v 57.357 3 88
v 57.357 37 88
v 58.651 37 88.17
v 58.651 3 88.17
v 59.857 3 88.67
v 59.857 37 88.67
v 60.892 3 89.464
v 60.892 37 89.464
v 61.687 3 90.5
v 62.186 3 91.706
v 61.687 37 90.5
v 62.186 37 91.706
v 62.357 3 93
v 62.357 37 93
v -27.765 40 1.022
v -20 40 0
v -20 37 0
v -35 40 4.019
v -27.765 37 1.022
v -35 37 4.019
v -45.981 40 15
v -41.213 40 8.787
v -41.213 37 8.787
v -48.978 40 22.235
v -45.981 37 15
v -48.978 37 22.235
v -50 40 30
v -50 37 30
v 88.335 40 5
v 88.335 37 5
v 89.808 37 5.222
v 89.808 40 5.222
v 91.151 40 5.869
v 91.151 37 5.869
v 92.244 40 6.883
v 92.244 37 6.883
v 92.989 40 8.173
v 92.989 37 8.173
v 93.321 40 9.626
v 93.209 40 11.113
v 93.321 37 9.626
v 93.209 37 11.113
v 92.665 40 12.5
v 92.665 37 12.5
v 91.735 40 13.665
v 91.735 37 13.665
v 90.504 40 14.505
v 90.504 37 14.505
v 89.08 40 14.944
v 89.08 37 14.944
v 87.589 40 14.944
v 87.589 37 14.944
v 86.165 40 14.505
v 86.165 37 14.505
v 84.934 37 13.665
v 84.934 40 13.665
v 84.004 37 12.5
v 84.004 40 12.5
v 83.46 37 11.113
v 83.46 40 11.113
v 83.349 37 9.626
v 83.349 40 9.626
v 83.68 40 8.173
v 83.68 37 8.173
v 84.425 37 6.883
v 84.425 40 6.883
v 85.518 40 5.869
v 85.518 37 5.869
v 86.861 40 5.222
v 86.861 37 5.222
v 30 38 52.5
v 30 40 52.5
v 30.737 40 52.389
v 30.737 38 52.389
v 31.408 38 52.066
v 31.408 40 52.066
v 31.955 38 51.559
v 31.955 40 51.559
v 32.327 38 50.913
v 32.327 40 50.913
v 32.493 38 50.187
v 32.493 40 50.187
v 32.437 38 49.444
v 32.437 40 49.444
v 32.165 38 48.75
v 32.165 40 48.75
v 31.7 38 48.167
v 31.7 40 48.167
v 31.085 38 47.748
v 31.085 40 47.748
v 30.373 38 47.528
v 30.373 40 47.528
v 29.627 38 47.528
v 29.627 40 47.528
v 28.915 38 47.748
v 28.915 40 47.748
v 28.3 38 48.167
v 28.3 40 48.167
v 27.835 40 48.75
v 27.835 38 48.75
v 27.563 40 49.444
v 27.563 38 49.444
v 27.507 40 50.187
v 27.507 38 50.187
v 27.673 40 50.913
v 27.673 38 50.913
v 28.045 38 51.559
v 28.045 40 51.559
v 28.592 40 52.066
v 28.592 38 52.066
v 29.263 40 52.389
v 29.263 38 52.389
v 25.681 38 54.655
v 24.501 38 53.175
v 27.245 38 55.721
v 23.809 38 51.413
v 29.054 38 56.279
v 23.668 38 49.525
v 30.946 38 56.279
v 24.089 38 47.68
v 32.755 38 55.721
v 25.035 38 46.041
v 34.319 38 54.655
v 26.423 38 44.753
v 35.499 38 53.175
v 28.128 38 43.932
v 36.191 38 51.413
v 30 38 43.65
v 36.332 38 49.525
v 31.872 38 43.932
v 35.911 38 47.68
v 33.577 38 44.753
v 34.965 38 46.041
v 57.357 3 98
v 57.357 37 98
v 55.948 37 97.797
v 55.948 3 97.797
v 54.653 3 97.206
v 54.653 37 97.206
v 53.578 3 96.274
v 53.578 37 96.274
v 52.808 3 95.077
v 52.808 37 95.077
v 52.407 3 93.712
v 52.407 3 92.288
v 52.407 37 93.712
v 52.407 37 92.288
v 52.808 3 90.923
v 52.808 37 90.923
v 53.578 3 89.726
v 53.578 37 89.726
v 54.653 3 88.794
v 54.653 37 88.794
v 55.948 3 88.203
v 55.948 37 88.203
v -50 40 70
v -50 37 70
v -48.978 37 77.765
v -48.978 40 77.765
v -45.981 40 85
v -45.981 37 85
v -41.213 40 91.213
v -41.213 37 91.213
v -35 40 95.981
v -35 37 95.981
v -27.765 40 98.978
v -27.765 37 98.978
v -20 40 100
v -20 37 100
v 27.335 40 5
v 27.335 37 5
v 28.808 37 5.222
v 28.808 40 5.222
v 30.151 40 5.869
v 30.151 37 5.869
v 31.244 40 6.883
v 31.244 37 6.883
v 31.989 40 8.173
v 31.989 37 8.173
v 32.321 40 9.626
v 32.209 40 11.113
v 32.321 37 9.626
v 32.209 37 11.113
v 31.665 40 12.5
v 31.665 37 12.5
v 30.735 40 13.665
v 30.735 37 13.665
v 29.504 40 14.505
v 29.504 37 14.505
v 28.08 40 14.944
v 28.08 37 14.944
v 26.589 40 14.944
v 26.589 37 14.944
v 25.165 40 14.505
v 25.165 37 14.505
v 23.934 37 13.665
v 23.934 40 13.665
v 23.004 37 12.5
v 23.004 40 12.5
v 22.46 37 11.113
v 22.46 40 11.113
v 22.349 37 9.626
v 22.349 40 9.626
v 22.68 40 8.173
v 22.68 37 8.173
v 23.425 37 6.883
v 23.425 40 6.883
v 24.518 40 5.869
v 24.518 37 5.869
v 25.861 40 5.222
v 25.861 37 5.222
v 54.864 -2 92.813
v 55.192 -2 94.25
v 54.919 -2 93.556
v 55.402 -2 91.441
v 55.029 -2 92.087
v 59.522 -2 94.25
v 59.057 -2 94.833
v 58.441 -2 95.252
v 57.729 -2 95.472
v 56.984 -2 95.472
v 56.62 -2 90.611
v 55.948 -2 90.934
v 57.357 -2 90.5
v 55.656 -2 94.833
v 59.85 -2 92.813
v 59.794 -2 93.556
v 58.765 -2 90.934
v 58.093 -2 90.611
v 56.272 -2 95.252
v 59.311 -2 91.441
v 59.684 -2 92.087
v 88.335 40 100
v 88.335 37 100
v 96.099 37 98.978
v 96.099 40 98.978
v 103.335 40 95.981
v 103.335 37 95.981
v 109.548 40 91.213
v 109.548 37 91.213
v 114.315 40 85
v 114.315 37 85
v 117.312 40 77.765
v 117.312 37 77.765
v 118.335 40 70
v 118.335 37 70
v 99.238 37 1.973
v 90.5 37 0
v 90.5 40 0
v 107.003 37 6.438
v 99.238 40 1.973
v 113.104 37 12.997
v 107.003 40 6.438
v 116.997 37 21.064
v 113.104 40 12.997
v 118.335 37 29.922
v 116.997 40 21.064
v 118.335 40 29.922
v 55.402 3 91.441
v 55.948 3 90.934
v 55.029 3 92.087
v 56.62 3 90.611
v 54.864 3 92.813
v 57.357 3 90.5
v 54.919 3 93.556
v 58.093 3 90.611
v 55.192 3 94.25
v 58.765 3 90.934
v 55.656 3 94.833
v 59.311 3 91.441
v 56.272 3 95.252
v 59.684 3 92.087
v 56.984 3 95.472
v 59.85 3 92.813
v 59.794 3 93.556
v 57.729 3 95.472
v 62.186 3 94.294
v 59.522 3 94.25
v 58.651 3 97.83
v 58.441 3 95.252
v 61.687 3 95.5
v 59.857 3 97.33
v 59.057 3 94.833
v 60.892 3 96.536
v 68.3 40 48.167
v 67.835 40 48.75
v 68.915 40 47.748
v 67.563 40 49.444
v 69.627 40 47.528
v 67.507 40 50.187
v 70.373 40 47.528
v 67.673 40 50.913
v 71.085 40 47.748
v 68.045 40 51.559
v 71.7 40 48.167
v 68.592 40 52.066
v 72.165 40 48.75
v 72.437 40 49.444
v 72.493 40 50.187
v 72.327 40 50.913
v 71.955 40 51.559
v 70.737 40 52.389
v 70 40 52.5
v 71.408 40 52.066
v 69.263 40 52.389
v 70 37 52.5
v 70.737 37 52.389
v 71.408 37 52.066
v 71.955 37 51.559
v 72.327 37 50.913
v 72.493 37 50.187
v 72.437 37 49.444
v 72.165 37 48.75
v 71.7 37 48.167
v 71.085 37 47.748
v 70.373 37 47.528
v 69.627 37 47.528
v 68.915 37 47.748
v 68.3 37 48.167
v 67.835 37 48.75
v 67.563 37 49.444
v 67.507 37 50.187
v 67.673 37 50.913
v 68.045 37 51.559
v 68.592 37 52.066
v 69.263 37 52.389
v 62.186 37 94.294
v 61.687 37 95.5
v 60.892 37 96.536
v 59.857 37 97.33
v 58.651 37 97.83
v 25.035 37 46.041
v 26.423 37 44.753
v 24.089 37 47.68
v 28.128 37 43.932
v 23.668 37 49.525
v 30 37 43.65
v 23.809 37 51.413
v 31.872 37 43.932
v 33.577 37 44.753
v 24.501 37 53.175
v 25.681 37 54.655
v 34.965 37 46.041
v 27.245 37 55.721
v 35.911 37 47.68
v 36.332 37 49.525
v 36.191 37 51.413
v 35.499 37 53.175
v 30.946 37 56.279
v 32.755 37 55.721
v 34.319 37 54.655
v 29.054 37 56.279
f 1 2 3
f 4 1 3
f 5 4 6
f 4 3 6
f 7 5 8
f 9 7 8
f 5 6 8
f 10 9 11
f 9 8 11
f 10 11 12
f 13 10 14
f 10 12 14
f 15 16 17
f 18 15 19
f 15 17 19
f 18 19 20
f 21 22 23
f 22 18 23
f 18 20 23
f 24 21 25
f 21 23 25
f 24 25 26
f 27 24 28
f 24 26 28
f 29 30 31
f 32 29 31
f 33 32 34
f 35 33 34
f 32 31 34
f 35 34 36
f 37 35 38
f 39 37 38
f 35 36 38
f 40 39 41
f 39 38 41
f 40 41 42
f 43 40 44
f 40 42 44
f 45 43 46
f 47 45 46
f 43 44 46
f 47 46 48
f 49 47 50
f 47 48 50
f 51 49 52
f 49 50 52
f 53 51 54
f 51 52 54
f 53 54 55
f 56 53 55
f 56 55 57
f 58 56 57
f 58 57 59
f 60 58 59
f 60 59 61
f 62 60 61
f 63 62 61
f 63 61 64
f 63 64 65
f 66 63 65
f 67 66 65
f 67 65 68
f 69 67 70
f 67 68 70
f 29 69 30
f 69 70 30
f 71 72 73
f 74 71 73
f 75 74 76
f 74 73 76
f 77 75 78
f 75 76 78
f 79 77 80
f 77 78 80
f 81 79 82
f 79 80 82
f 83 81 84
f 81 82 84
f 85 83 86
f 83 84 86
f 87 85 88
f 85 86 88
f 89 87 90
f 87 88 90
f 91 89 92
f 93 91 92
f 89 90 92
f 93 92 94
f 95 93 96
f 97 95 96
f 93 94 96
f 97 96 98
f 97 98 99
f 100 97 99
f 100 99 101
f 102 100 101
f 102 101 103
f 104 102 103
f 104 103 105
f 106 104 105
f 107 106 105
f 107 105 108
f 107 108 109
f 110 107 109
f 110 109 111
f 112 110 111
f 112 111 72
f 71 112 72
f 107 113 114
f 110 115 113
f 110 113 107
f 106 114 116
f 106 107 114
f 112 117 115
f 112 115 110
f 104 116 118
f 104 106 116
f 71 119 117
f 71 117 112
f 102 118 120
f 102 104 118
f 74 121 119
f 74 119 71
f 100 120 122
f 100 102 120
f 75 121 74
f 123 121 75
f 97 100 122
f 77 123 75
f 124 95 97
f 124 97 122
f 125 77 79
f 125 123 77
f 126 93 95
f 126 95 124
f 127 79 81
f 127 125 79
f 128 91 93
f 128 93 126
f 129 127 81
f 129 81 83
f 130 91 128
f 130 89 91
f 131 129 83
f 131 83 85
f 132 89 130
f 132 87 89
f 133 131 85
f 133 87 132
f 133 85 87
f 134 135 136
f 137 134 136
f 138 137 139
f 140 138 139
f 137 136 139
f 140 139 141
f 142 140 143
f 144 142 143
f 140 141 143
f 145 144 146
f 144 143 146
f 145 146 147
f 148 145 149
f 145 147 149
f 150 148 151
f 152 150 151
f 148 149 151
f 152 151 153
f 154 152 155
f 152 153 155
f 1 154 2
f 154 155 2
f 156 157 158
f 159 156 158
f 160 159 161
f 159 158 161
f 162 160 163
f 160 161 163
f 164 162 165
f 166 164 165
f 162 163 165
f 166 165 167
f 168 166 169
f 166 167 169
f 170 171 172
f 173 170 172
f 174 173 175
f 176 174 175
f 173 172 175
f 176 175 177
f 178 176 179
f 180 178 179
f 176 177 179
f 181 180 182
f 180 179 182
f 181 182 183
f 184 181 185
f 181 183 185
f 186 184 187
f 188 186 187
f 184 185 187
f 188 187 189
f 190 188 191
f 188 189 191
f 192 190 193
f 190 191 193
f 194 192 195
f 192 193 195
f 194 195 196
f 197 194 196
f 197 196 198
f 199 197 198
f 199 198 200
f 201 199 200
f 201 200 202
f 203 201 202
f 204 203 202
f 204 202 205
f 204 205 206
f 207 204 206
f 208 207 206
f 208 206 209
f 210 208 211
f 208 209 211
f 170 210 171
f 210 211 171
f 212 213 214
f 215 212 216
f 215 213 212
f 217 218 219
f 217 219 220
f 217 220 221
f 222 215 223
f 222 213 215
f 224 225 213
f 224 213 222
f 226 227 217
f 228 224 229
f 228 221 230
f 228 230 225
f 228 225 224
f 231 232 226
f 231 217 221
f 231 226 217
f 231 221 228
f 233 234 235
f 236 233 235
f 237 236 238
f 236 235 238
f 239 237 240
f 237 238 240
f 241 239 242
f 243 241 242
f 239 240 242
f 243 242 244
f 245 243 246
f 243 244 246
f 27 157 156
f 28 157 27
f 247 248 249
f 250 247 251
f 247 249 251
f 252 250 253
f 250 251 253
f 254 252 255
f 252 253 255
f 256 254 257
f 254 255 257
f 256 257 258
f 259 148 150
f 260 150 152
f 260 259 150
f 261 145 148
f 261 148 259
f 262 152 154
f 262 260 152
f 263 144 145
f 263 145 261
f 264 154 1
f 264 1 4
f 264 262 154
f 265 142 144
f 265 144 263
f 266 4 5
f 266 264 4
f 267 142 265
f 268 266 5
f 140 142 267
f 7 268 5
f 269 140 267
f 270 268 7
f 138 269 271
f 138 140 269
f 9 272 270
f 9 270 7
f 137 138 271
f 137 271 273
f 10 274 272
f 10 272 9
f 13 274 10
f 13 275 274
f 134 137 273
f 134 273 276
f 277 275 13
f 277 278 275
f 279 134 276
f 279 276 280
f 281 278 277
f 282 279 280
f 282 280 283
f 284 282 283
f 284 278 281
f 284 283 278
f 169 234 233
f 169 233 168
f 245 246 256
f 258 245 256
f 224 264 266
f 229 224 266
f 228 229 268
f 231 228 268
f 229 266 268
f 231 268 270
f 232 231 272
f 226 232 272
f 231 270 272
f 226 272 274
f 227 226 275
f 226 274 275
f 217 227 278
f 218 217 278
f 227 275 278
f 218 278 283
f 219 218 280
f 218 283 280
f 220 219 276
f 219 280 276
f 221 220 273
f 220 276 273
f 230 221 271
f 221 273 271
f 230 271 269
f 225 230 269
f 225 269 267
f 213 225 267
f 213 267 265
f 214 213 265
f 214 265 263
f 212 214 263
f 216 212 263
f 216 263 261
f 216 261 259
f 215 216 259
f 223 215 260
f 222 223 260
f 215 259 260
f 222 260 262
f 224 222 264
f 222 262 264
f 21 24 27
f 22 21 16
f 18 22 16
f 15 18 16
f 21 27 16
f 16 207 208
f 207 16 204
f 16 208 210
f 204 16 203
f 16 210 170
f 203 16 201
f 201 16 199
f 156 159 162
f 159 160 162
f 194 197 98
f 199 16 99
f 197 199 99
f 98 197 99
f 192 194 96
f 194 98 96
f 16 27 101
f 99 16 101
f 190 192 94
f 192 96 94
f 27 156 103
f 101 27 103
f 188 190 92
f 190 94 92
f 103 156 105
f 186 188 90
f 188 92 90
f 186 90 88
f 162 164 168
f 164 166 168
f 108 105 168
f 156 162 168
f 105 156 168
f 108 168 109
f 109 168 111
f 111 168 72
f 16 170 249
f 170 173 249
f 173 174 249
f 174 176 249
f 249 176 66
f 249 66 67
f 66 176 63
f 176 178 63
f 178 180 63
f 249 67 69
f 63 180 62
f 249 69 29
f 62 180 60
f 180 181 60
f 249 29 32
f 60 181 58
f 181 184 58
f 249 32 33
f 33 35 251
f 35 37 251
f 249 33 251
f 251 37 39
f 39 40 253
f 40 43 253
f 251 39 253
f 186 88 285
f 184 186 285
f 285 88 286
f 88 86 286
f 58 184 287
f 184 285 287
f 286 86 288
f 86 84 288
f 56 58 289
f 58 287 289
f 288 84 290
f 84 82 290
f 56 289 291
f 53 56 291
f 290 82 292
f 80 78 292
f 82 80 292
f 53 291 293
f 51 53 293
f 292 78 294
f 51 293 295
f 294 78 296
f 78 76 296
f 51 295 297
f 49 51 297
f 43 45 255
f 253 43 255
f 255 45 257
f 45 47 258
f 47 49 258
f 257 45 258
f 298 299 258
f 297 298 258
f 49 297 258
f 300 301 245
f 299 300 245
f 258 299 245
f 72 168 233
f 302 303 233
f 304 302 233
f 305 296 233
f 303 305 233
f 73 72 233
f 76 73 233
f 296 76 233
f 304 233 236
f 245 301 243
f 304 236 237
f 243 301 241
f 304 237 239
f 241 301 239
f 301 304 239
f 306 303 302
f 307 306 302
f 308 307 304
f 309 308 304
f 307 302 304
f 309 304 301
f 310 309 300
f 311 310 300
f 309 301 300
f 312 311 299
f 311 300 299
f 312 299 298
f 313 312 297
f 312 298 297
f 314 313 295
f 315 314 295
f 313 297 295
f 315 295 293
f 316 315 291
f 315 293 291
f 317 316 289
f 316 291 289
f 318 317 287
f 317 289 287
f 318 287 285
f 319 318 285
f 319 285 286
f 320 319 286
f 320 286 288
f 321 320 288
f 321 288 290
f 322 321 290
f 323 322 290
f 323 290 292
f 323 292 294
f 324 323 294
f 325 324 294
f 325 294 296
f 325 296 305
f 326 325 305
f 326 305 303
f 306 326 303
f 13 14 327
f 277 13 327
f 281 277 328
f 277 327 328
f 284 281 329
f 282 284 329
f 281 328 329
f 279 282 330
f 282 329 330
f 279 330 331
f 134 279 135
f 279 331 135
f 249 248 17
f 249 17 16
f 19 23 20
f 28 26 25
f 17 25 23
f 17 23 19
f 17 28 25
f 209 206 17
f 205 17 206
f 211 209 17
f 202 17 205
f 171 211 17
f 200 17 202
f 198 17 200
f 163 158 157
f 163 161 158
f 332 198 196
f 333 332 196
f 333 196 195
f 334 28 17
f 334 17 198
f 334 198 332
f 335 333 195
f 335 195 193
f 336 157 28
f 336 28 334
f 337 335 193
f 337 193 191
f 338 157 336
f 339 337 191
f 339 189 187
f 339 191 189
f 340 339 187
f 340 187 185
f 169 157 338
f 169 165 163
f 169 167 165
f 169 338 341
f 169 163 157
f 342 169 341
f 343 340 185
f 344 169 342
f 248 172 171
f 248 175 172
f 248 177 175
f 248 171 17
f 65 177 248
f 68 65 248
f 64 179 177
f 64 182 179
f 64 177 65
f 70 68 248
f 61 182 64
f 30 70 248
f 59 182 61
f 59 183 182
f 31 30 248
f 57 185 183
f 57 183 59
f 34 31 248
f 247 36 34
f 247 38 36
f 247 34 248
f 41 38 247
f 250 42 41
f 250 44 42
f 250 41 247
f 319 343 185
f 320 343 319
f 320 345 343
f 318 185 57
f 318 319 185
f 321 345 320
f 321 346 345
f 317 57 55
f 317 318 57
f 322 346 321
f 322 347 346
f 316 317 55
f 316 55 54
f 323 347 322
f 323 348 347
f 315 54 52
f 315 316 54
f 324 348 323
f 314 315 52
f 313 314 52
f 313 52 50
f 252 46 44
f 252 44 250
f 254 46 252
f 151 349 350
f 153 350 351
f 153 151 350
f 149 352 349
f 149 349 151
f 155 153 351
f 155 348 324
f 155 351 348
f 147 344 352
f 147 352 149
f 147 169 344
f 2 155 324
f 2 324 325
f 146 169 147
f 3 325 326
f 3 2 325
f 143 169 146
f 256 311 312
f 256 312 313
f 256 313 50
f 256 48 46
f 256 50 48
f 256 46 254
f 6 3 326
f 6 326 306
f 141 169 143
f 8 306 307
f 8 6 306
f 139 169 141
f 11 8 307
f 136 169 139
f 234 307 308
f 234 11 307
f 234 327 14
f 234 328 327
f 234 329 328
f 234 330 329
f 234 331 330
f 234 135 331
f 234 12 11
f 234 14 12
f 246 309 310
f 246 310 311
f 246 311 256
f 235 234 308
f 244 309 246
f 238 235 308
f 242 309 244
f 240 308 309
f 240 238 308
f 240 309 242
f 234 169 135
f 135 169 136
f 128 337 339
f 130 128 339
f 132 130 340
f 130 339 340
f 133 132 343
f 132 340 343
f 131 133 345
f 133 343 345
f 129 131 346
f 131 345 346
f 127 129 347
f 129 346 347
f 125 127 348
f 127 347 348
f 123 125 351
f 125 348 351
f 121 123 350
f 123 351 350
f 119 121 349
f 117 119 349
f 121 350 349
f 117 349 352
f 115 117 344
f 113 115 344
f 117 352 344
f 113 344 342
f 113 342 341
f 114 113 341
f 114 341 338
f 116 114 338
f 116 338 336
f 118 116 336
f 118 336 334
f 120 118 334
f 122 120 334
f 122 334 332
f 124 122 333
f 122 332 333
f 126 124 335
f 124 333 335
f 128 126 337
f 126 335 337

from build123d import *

# Parameters (mm, degrees)
EXTRUDE_1_DEPTH           = 50
EXTRUDE_1_DEPTH_BACK      = 50
SKETCH_2_W                = 200
SKETCH_2_H                = 100
EXTRUDE_2_DEPTH           = 40
SKETCH_3_W                = 200
SKETCH_3_H                = 34
CUT_EXTRUDE_1_DEPTH       = 100
CUT_EXTRUDE_2_DEPTH       = 279.66871012
SKETCH_8_R                = 2.5
CUT_EXTRUDE_4_DEPTH       = 276.238532913
SKETCH_10_R               = 5
CUT_EXTRUDE_5_DEPTH       = 260.608358879
EXTRUDE_5_DEPTH           = 10
SKETCH_13_W               = 74.115787845
SKETCH_13_H               = 3
EXTRUDE_7_DEPTH           = 81
SKETCH_14_W               = 207.5
SKETCH_14_H               = 100
EXTRUDE_8_DEPTH           = 7
EXTRUDE_9_DEPTH           = 10
SKETCH_17_R               = 6.35
CUT_EXTRUDE_6_DEPTH       = 1
CUT_EXTRUDE_START         = -1
SKETCH_18_R               = 6.35
CUT_EXTRUDE_7_DEPTH       = 1
SKETCH_20_R               = 5
CUT_EXTRUDE_8_DEPTH       = 3
CUT_EXTRUDE_9_DEPTH       = 273.255129638
CUT_EXTRUDE_9_DEPTH_BACK  = 273.255129638
SKETCH_21_W               = 31.665374736
SKETCH_21_H               = 100
SKETCH_22_R               = 5
EXTRUDE_10_DEPTH          = 37
FILLET_1_R                = 30
FILLET_2_R                = 30
CUT_EXTRUDE_10_DEPTH      = 248.444254611
CUT_EXTRUDE_10_DEPTH_BACK = 248.444254611
CUT_EXTRUDE_11_DEPTH      = 211.689689342
CUT_EXTRUDE_11_DEPTH_BACK = 211.689689342
CUT_EXTRUDE_12_DEPTH      = 174.368632309
CUT_EXTRUDE_12_DEPTH_BACK = 174.368632309
SKETCH_26_R               = 5
CUT_EXTRUDE_13_DEPTH      = 153.295269567
CUT_EXTRUDE_13_DEPTH_BACK = 153.295269567
CUT_EXTRUDE_14_DEPTH      = 160.286168691
CUT_EXTRUDE_14_DEPTH_BACK = 160.286168691
SKETCH_30_R               = 7.5
CUT_EXTRUDE_15_DEPTH      = 160.286168691
CUT_EXTRUDE_15_DEPTH_BACK = 160.286168691
SKETCH_31_R               = 7.5
SKETCH_31_R_2             = 5
SKETCH_32_R               = 7.5
SKETCH_32_R_2             = 5
EXTRUDE_12_DEPTH          = 3
SKETCH_33_R               = 7.5
SKETCH_33_R_2             = 5
EXTRUDE_13_DEPTH          = 3
SKETCH_34_R               = 5
EXTRUDE_14_DEPTH          = 45
CUT_EXTRUDE_17_DEPTH      = 178.031776809
CUT_EXTRUDE_17_DEPTH_BACK = 178.031776809
SKETCH_37_W               = 132.207085757
SKETCH_37_H               = 67.753693261
EXTRUDE_19_DEPTH          = 34
SKETCH_44_R               = 2.5
EXTRUDE_20_DEPTH          = 5
SKETCH_41_R               = 7.5
SKETCH_41_R_2             = 5
EXTRUDE_17_DEPTH          = 3
SKETCH_42_R               = 7.5
SKETCH_42_R_2             = 5
EXTRUDE_18_DEPTH          = 3


with BuildPart() as part:
    # 草图1 → 凸台-拉伸1 (new, two sides: drawn at the far end of the back side and taken through both)
    with BuildSketch(Plane(origin=(0, 0, 0), x_dir=(1, 0, 0), z_dir=(0, 1, 0)).offset(-EXTRUDE_1_DEPTH_BACK)):
        Polygon((9.5, 12.5), (9.5, 0), (90.5, 0), (90.5, 12.5), (90.5, 212.5), (9.5, 212.5), align=None)
    extrude(amount=EXTRUDE_1_DEPTH + EXTRUDE_1_DEPTH_BACK)

    # 草图2 → 凸台-拉伸2 (add)
    with BuildSketch(Plane(origin=(0, 0, 0), x_dir=(-1, 0, 0), z_dir=(0, -1, 0))):
        with Locations((-50, -50)):
            Rectangle(SKETCH_2_W, SKETCH_2_H)
    extrude(amount=-EXTRUDE_2_DEPTH)

    # 草图3 → 切除-拉伸1 (cut)
    with BuildSketch(Plane.XY.offset(100)):
        with Locations((50, 20)):
            Rectangle(SKETCH_3_W, SKETCH_3_H)
    extrude(amount=-CUT_EXTRUDE_1_DEPTH, mode=Mode.SUBTRACT)

    # 草图6 → 切除-拉伸2 (cut, through all)
    with BuildSketch(Plane(origin=(0, 50, 0), x_dir=(1, 0, 0), z_dir=(0, 1, 0))):
        Polygon((12.5, 905.325014188), (12.5, 212.5), (12.5, 5), (87.5, 5), (87.5, 212.5), (87.5, 905.325014188), (87.5, 2290.975042562), (12.5, 2290.975042562), align=None)
    extrude(amount=-CUT_EXTRUDE_2_DEPTH, mode=Mode.SUBTRACT)

    # 草图8 → 切除-拉伸4 (cut, through all)
    with BuildSketch(Plane(origin=(0, 40, 0), x_dir=(1, 0, 0), z_dir=(0, 1, 0))):
        with Locations(Location((70, -50, 0), (0, 0, 270))):
            Circle(SKETCH_8_R)
        with Locations(Location((30, -50, 0), (0, 0, 270))):
            Circle(SKETCH_8_R)
    extrude(amount=-CUT_EXTRUDE_4_DEPTH, mode=Mode.SUBTRACT)

    # 草图10 → 切除-拉伸5 (cut, through all)
    with BuildSketch(Plane(origin=(90.5, 0, 0), x_dir=(0, 0, -1), z_dir=(1, 0, 0))):
        with Locations((80, 0)):
            Circle(SKETCH_10_R)
        with Locations((180, 0)):
            Circle(SKETCH_10_R)
    extrude(amount=-CUT_EXTRUDE_5_DEPTH, mode=Mode.SUBTRACT)

    # 草图11 → 凸台-拉伸5 (add)
    with BuildSketch(Plane.ZY.offset(-9.5)):
        Polygon((-30.905613639, 83.415207604), (-74.094429483, 50), (0, 50), (0, 40), (83.32101017, 40), align=None)
    extrude(amount=-EXTRUDE_5_DEPTH)

    # 草图13 → 凸台-拉伸7 (add)
    with BuildSketch(Plane(origin=(90.5, 0, 0), x_dir=(0, 0, -1), z_dir=(1, 0, 0))):
        with Locations((37.057893922, 51.5)):
            Rectangle(SKETCH_13_W, SKETCH_13_H)
    extrude(amount=-EXTRUDE_7_DEPTH)

    # 草图14 → 凸台-拉伸8 (add)
    with BuildSketch(Plane(origin=(12.5, 0, 0), x_dir=(0, 0, -1), z_dir=(1, 0, 0))):
        with Locations((108.75, 0)):
            Rectangle(SKETCH_14_W, SKETCH_14_H)
    extrude(amount=EXTRUDE_8_DEPTH)

    # 草图15 → 凸台-拉伸9 (add)
    with BuildSketch(Plane(origin=(90.5, 0, 0), x_dir=(0, 0, -1), z_dir=(1, 0, 0))):
        Polygon((30.905613639, 83.415207604), (-82.902171575, 40), (0, 40), (0, 53), (70.216960007, 53), align=None)
    extrude(amount=-EXTRUDE_9_DEPTH)

    # 草图17 → 切除-拉伸6 (cut)
    with BuildSketch(Plane(origin=(0, 37, 0), x_dir=(-1, 0, 0), z_dir=(0, -1, 0))):
        with Locations(Location((-30, -50, 0), (0, 0, 90))):
            Circle(SKETCH_17_R)
    extrude(amount=-CUT_EXTRUDE_6_DEPTH, mode=Mode.SUBTRACT)

    # 草图18 → 切除-拉伸7 (cut)
    with BuildSketch(Plane(origin=(0, 3, 0), x_dir=(1, 0, 0), z_dir=(0, 1, 0)).offset(CUT_EXTRUDE_START)):
        with Locations(Location((30, -50, 0), (0, 0, 90))):
            Circle(SKETCH_18_R)
    extrude(amount=CUT_EXTRUDE_7_DEPTH, mode=Mode.SUBTRACT)

    # 草图20 → 切除-拉伸8 (cut)
    with BuildSketch(Plane.XZ):
        with Locations(Location((-31.25, 50, 0), (0, 0, 270))):
            Circle(SKETCH_20_R)
        with Locations(Location((91.25, 50, 0), (0, 0, 270))):
            Circle(SKETCH_20_R)
    extrude(amount=-CUT_EXTRUDE_8_DEPTH, mode=Mode.SUBTRACT)

    # 草图21 → 切除-拉伸9 (cut, two sides: drawn at the far end of the back side and taken through both)
    with BuildSketch(Plane(origin=(0, 3, 0), x_dir=(1, 0, 0), z_dir=(0, 1, 0)).offset(-CUT_EXTRUDE_9_DEPTH_BACK)):
        with Locations((134.167312632, -50)):
            Rectangle(SKETCH_21_W, SKETCH_21_H)
    extrude(amount=CUT_EXTRUDE_9_DEPTH + CUT_EXTRUDE_9_DEPTH_BACK, mode=Mode.SUBTRACT)

    # 草图22 → 凸台-拉伸10 (add)
    with BuildSketch(Plane.XZ):
        with Locations((-28.834995313, 14.93844285)):
            Circle(SKETCH_22_R)
        with Locations((99.943738589, 14.93844285)):
            Circle(SKETCH_22_R)
        with Locations((47.358621855, 88.902784002)):
            Circle(SKETCH_22_R)
    extrude(amount=-EXTRUDE_10_DEPTH)

    # 圆角1
    # the kernel refuses this fillet: 30 mm, written as the material it takes off along each edge
    with BuildSketch(Plane(origin=(-32.536340759, 83.415207604, -30.905613639), x_dir=(0, -0.6119293356637439, -0.7909124402575352), z_dir=(1, 0, 0))) as fillet_1_piece_1:
        with BuildLine():
            CenterArc((FILLET_1_R * 0.560484543454, -FILLET_1_R), FILLET_1_R, 90, 58.539912966)
            Line((-FILLET_1_R * 0.292519393108, -FILLET_1_R * 0.478095521948), (-FILLET_1_R * 0.309579471839, -FILLET_1_R * 0.467657432387))
            Line((-FILLET_1_R * 0.309579471839, -FILLET_1_R * 0.467657432387), (-FILLET_1_R * 0.0112096908691, FILLET_1_R * 0.02))
            Line((-FILLET_1_R * 0.0112096908691, FILLET_1_R * 0.02), (FILLET_1_R * 0.560484543454, FILLET_1_R * 0.02))
            Line((FILLET_1_R * 0.560484543454, FILLET_1_R * 0.02), (FILLET_1_R * 0.560484543454, 0))
        make_face()
    extrude(amount=94.072681518, mode=Mode.SUBTRACT)
    with BuildSketch(Plane(origin=(132.596564701, 83.415207604, -30.905613639), x_dir=(0, -0.6119293356637436, -0.7909124402575354), z_dir=(-1, 0, 0))) as fillet_1_piece_2:
        with BuildLine():
            CenterArc((FILLET_1_R * 0.561287529341, FILLET_1_R), FILLET_1_R, 211.390091687, 58.609908313)
            Line((-FILLET_1_R * 0.292353354769, FILLET_1_R * 0.479137982787), (-FILLET_1_R * 0.309426172451, FILLET_1_R * 0.468720742443))
            Line((-FILLET_1_R * 0.309426172451, FILLET_1_R * 0.468720742443), (-FILLET_1_R * 0.0112257505868, -FILLET_1_R * 0.02))
            Line((-FILLET_1_R * 0.0112257505868, -FILLET_1_R * 0.02), (FILLET_1_R * 0.561287529341, -FILLET_1_R * 0.02))
            Line((FILLET_1_R * 0.561287529341, -FILLET_1_R * 0.02), (FILLET_1_R * 0.561287529341, 0))
        make_face()
    extrude(amount=94.193129401, mode=Mode.SUBTRACT)
    with BuildSketch(Plane(origin=(118.334625264, -38, 100), x_dir=(-1, 0, 0), z_dir=(0, 1, 0)), Plane(origin=(118.334625264, -75, 100), x_dir=(-1, 0, 0), z_dir=(0, 1, 0)), Plane(origin=(-50, -38, 0), x_dir=(1, 0, 0), z_dir=(0, 1, 0)), Plane(origin=(-50, -38, 100), x_dir=(0, 0, -1), z_dir=(0, 1, 0)), Plane(origin=(-50, -75, 100), x_dir=(0, 0, -1), z_dir=(0, 1, 0)), Plane(origin=(-50, -75, 0), x_dir=(1, 0, 0), z_dir=(0, 1, 0))) as fillet_1_piece_3:
        with BuildLine():
            CenterArc((FILLET_1_R, -FILLET_1_R), FILLET_1_R, 90, 90)
            Line((0, -FILLET_1_R), (-FILLET_1_R * 0.02, -FILLET_1_R))
            Line((-FILLET_1_R * 0.02, -FILLET_1_R), (-FILLET_1_R * 0.02, FILLET_1_R * 0.02))
            Line((-FILLET_1_R * 0.02, FILLET_1_R * 0.02), (FILLET_1_R, FILLET_1_R * 0.02))
            Line((FILLET_1_R, FILLET_1_R * 0.02), (FILLET_1_R, 0))
        make_face()
    extrude(amount=153, mode=Mode.SUBTRACT)
    with BuildSketch(Plane(origin=(118.334625264, 114.804376219, 0), x_dir=(0, 0, 1), z_dir=(0, -1, 0))) as fillet_1_piece_4:
        with BuildLine():
            CenterArc((29.921750488, 30), FILLET_1_R, 184.139160489, 85.860839511)
            Line((0, 27.834625264), (-0.59843501, 27.791317769))
            ThreePointArc((-0.59843501, 27.791317769), (-0.6, 13.917312632), (-0.6, 0))
            Line((-0.6, 0), (0, -0.6))
            Line((0, -0.6), (29.921750488, -0.6))
            Line((29.921750488, -0.6), (29.921750488, 0))
        make_face()
    extrude(amount=152.608752439, mode=Mode.SUBTRACT)
    with BuildSketch(Plane(origin=(118.334625264, 77.804376219, 0), x_dir=(-1, 0, 0), z_dir=(0, -1, 0))) as fillet_1_piece_5:
        with BuildLine():
            CenterArc((30, -29.921750488), FILLET_1_R, 94.139160489, 85.860839511)
            Line((0, -29.921750488), (-0.6, -29.921750488))
            Line((-0.6, -29.921750488), (-0.6, 0))
            Line((-0.6, 0), (0, 0.6))
            ThreePointArc((0, 0.6), (13.917312632, 0.6), (27.791317769, 0.59843501))
            Line((27.791317769, 0.59843501), (27.834625264, 0))
        make_face()
    extrude(amount=152.608752439, mode=Mode.SUBTRACT)

    # 圆角2
    fillet_2_edges = [part.edges().sort_by_distance(p)[0] for p in [
        (89, 50, -212.5),
        (89, -50, -212.5),
        (14.5, 50, -212.5),
        (14.5, -50, -212.5),
    ]]
    fillet(fillet_2_edges, radius=FILLET_2_R)

    # 草图23 → 切除-拉伸10 (cut, two sides: drawn at the far end of the back side and taken through both)
    with BuildSketch(Plane(origin=(19.5, 0, 0), x_dir=(0, 0, -1), z_dir=(1, 0, 0)).offset(-CUT_EXTRUDE_10_DEPTH_BACK)):
        Polygon((-82.902171575, 40), (15.172878857, 77.413509693), (30.26062931, 83.169160038), (82.911746167, 53.484816406), (216.982404769, 51.400816531), (216.982404769, -53.030732743), (0, -55.346288159), (0, 40), align=None)
    extrude(amount=CUT_EXTRUDE_10_DEPTH + CUT_EXTRUDE_10_DEPTH_BACK, mode=Mode.SUBTRACT)

    # 草图25 → 切除-拉伸11 (cut, two sides: drawn at the far end of the back side and taken through both)
    with BuildSketch(Plane(origin=(118.334625264, 0, 0), x_dir=(0, 0, -1), z_dir=(1, 0, 0)).offset(-CUT_EXTRUDE_11_DEPTH_BACK)):
        Polygon((-96.999238457, 37), (-5.714105567, 37), (-5.714105567, 3), (-98.622428797, 3), align=None)
    extrude(amount=CUT_EXTRUDE_11_DEPTH + CUT_EXTRUDE_11_DEPTH_BACK, mode=Mode.SUBTRACT)


with BuildPart() as cut_extrude_11_piece_1:
    # of the separate pieces the step leaves, piece 1, a body of its own (cut_extrude_11_pieces)
    add(part.part.solids().sort_by_distance((118.334625264, 37, 70))[0])


with BuildPart() as cut_extrude_11_piece_2:
    # of the separate pieces the step leaves, piece 2, a body of its own (cut_extrude_11_pieces)
    add(part.part.solids().sort_by_distance((-20, 0, 0))[0])


with BuildPart() as cut_extrude_12_tool:
    # 草图26 → 切除-拉伸12 (new, two sides: drawn at the far end of the back side and taken through both)
    with BuildSketch(Plane.XZ.offset(-CUT_EXTRUDE_12_DEPTH_BACK)):
        with Locations(Location((88.334625264, 10, 0), (0, 0, 270))):
            Circle(SKETCH_26_R)
        with Locations(Location((27.334625264, 10, 0), (0, 0, 270))):
            Circle(SKETCH_26_R)
    extrude(amount=CUT_EXTRUDE_12_DEPTH + CUT_EXTRUDE_12_DEPTH_BACK)


with BuildPart() as cut_extrude_11_piece_1_1:
    add(cut_extrude_11_piece_1.part)

    # 切除-拉伸12: cut by cut_extrude_12_tool
    add(cut_extrude_12_tool.part, mode=Mode.SUBTRACT)

    # 草图27 → 切除-拉伸13 (cut, two sides: drawn at the far end of the back side and taken through both)
    with BuildSketch(Plane.ZY.offset(-34.5).offset(-CUT_EXTRUDE_13_DEPTH_BACK)):
        Polygon((-18.94184398, 81.696068066), (-17.663883038, 66.307288383), (80.739109538, 40), (87.341907742, 40), align=None)
    extrude(amount=CUT_EXTRUDE_13_DEPTH + CUT_EXTRUDE_13_DEPTH_BACK, mode=Mode.SUBTRACT)


with BuildPart() as cut_extrude_11_piece_2_1:
    add(cut_extrude_11_piece_2.part)

    # 切除-拉伸12: cut by cut_extrude_12_tool
    add(cut_extrude_12_tool.part, mode=Mode.SUBTRACT)


with BuildPart() as cut_extrude_14_tool:
    # 草图30 → 切除-拉伸14 (new, two sides: drawn at the far end of the back side and taken through both)
    with BuildSketch(Plane.XZ.offset(-37).offset(-CUT_EXTRUDE_14_DEPTH_BACK)):
        with Locations(Location((88.334625264, 10, 0), (0, 0, 270))):
            Circle(SKETCH_30_R)
    extrude(amount=CUT_EXTRUDE_14_DEPTH + CUT_EXTRUDE_14_DEPTH_BACK)


with BuildPart() as cut_extrude_11_piece_1_2:
    add(cut_extrude_11_piece_1_1.part)

    # 切除-拉伸14: cut by cut_extrude_14_tool
    add(cut_extrude_14_tool.part, mode=Mode.SUBTRACT)


with BuildPart() as cut_extrude_11_piece_2_2:
    add(cut_extrude_11_piece_2_1.part)

    # 切除-拉伸14: cut by cut_extrude_14_tool
    add(cut_extrude_14_tool.part, mode=Mode.SUBTRACT)


with BuildPart() as cut_extrude_15_tool:
    # 草图31 → 切除-拉伸15 (new, two sides: drawn at the far end of the back side and taken through both)
    with BuildSketch(Plane.XZ.offset(-37).offset(-CUT_EXTRUDE_15_DEPTH_BACK)):
        with Locations(Location((27.334625264, 10, 0), (0, 0, 270))):
            Circle(SKETCH_31_R)
        with Locations((27.334625264, 10)):
            Circle(SKETCH_31_R_2, mode=Mode.SUBTRACT)
    extrude(amount=CUT_EXTRUDE_15_DEPTH + CUT_EXTRUDE_15_DEPTH_BACK)


with BuildPart() as cut_extrude_11_piece_1_3:
    add(cut_extrude_11_piece_1_2.part)

    # 切除-拉伸15: cut by cut_extrude_15_tool
    add(cut_extrude_15_tool.part, mode=Mode.SUBTRACT)



with BuildPart() as cut_extrude_11_piece_2_3:
    add(cut_extrude_11_piece_2_2.part)

    # 切除-拉伸15: cut by cut_extrude_15_tool
    add(cut_extrude_15_tool.part, mode=Mode.SUBTRACT)

    # 草图32 → 凸台-拉伸12 (add)
    with BuildSketch(Plane.XZ):
        with Locations(Location((27.334625264, 10, 0), (0, 0, 270))):
            Circle(SKETCH_32_R)
        with Locations(Location((27.334625264, 10, 0), (0, 0, 270))):
            Circle(SKETCH_32_R_2, mode=Mode.SUBTRACT)
    extrude(amount=-EXTRUDE_12_DEPTH)

    # 草图33 → 凸台-拉伸13 (add)
    with BuildSketch(Plane.XZ):
        with Locations(Location((88.334625264, 10, 0), (0, 0, 270))):
            Circle(SKETCH_33_R)
        with Locations(Location((88.334625264, 10, 0), (0, 0, 270))):
            Circle(SKETCH_33_R_2, mode=Mode.SUBTRACT)
    extrude(amount=-EXTRUDE_13_DEPTH)


with BuildPart() as cut_extrude_11_piece_1_4:
    add(cut_extrude_11_piece_1_3.part)

    add(cut_extrude_11_piece_2_3.part)  # 凸台-拉伸14 merges 切除-拉伸11 piece 2
    # 草图34 → 凸台-拉伸14 (add)
    with BuildSketch(Plane.XZ.offset(-37)):
        with Locations(Location((57.356592352, 86.553493229, 0), (0, 0, 90))):
            Circle(SKETCH_34_R)
    extrude(amount=EXTRUDE_14_DEPTH)

    # 草图37 → 切除-拉伸17 (cut, two sides: drawn at the far end of the back side and taken through both)
    with BuildSketch(Plane(origin=(90.5, 0, 0), x_dir=(0, 0, -1), z_dir=(1, 0, 0)).offset(-CUT_EXTRUDE_17_DEPTH_BACK)):
        with Locations((-61.671884505, 3.123153369)):
            Rectangle(SKETCH_37_W, SKETCH_37_H)
    extrude(amount=CUT_EXTRUDE_17_DEPTH + CUT_EXTRUDE_17_DEPTH_BACK, mode=Mode.SUBTRACT)

    # 草图43 → 凸台-拉伸19 (add)
    with BuildSketch(Plane.XZ.offset(-37)):
        with BuildLine():
            ThreePointArc((57.356592352, 98), (52.356592352, 93), (57.356592352, 88))
            Line((57.356592352, 88), (57.356592352, 98))
        make_face()
        with BuildLine():
            Line((57.356592352, 98), (57.356592352, 88))
            ThreePointArc((57.356592352, 88), (60.892126258, 89.464466094), (62.356592352, 93))
            ThreePointArc((62.356592352, 93), (60.892126258, 96.535533906), (57.356592352, 98))
        make_face()
    extrude(amount=EXTRUDE_19_DEPTH)

    # 草图44 → 凸台-拉伸20 (add)
    with BuildSketch(Plane.XZ.offset(-3)):
        with Locations(Location((57.356592352, 93, 0), (0, 0, 270))):
            Circle(SKETCH_44_R)
    extrude(amount=EXTRUDE_20_DEPTH)

    # 草图41 → 凸台-拉伸17 (add)
    with BuildSketch(Plane.XZ.offset(-37)):
        with Locations((27.334625264, 10)):
            Circle(SKETCH_41_R)
        with Locations(Location((27.334625264, 10, 0), (0, 0, 270))):
            Circle(SKETCH_41_R_2, mode=Mode.SUBTRACT)
    extrude(amount=-EXTRUDE_17_DEPTH)

    # 草图42 → 凸台-拉伸18 (add)
    with BuildSketch(Plane.XZ.offset(-37)):
        with Locations((88.334625264, 10)):
            Circle(SKETCH_42_R)
        with Locations(Location((88.334625264, 10, 0), (0, 0, 270))):
            Circle(SKETCH_42_R_2, mode=Mode.SUBTRACT)
    extrude(amount=-EXTRUDE_18_DEPTH)


solid = cut_extrude_11_piece_1_4.part
